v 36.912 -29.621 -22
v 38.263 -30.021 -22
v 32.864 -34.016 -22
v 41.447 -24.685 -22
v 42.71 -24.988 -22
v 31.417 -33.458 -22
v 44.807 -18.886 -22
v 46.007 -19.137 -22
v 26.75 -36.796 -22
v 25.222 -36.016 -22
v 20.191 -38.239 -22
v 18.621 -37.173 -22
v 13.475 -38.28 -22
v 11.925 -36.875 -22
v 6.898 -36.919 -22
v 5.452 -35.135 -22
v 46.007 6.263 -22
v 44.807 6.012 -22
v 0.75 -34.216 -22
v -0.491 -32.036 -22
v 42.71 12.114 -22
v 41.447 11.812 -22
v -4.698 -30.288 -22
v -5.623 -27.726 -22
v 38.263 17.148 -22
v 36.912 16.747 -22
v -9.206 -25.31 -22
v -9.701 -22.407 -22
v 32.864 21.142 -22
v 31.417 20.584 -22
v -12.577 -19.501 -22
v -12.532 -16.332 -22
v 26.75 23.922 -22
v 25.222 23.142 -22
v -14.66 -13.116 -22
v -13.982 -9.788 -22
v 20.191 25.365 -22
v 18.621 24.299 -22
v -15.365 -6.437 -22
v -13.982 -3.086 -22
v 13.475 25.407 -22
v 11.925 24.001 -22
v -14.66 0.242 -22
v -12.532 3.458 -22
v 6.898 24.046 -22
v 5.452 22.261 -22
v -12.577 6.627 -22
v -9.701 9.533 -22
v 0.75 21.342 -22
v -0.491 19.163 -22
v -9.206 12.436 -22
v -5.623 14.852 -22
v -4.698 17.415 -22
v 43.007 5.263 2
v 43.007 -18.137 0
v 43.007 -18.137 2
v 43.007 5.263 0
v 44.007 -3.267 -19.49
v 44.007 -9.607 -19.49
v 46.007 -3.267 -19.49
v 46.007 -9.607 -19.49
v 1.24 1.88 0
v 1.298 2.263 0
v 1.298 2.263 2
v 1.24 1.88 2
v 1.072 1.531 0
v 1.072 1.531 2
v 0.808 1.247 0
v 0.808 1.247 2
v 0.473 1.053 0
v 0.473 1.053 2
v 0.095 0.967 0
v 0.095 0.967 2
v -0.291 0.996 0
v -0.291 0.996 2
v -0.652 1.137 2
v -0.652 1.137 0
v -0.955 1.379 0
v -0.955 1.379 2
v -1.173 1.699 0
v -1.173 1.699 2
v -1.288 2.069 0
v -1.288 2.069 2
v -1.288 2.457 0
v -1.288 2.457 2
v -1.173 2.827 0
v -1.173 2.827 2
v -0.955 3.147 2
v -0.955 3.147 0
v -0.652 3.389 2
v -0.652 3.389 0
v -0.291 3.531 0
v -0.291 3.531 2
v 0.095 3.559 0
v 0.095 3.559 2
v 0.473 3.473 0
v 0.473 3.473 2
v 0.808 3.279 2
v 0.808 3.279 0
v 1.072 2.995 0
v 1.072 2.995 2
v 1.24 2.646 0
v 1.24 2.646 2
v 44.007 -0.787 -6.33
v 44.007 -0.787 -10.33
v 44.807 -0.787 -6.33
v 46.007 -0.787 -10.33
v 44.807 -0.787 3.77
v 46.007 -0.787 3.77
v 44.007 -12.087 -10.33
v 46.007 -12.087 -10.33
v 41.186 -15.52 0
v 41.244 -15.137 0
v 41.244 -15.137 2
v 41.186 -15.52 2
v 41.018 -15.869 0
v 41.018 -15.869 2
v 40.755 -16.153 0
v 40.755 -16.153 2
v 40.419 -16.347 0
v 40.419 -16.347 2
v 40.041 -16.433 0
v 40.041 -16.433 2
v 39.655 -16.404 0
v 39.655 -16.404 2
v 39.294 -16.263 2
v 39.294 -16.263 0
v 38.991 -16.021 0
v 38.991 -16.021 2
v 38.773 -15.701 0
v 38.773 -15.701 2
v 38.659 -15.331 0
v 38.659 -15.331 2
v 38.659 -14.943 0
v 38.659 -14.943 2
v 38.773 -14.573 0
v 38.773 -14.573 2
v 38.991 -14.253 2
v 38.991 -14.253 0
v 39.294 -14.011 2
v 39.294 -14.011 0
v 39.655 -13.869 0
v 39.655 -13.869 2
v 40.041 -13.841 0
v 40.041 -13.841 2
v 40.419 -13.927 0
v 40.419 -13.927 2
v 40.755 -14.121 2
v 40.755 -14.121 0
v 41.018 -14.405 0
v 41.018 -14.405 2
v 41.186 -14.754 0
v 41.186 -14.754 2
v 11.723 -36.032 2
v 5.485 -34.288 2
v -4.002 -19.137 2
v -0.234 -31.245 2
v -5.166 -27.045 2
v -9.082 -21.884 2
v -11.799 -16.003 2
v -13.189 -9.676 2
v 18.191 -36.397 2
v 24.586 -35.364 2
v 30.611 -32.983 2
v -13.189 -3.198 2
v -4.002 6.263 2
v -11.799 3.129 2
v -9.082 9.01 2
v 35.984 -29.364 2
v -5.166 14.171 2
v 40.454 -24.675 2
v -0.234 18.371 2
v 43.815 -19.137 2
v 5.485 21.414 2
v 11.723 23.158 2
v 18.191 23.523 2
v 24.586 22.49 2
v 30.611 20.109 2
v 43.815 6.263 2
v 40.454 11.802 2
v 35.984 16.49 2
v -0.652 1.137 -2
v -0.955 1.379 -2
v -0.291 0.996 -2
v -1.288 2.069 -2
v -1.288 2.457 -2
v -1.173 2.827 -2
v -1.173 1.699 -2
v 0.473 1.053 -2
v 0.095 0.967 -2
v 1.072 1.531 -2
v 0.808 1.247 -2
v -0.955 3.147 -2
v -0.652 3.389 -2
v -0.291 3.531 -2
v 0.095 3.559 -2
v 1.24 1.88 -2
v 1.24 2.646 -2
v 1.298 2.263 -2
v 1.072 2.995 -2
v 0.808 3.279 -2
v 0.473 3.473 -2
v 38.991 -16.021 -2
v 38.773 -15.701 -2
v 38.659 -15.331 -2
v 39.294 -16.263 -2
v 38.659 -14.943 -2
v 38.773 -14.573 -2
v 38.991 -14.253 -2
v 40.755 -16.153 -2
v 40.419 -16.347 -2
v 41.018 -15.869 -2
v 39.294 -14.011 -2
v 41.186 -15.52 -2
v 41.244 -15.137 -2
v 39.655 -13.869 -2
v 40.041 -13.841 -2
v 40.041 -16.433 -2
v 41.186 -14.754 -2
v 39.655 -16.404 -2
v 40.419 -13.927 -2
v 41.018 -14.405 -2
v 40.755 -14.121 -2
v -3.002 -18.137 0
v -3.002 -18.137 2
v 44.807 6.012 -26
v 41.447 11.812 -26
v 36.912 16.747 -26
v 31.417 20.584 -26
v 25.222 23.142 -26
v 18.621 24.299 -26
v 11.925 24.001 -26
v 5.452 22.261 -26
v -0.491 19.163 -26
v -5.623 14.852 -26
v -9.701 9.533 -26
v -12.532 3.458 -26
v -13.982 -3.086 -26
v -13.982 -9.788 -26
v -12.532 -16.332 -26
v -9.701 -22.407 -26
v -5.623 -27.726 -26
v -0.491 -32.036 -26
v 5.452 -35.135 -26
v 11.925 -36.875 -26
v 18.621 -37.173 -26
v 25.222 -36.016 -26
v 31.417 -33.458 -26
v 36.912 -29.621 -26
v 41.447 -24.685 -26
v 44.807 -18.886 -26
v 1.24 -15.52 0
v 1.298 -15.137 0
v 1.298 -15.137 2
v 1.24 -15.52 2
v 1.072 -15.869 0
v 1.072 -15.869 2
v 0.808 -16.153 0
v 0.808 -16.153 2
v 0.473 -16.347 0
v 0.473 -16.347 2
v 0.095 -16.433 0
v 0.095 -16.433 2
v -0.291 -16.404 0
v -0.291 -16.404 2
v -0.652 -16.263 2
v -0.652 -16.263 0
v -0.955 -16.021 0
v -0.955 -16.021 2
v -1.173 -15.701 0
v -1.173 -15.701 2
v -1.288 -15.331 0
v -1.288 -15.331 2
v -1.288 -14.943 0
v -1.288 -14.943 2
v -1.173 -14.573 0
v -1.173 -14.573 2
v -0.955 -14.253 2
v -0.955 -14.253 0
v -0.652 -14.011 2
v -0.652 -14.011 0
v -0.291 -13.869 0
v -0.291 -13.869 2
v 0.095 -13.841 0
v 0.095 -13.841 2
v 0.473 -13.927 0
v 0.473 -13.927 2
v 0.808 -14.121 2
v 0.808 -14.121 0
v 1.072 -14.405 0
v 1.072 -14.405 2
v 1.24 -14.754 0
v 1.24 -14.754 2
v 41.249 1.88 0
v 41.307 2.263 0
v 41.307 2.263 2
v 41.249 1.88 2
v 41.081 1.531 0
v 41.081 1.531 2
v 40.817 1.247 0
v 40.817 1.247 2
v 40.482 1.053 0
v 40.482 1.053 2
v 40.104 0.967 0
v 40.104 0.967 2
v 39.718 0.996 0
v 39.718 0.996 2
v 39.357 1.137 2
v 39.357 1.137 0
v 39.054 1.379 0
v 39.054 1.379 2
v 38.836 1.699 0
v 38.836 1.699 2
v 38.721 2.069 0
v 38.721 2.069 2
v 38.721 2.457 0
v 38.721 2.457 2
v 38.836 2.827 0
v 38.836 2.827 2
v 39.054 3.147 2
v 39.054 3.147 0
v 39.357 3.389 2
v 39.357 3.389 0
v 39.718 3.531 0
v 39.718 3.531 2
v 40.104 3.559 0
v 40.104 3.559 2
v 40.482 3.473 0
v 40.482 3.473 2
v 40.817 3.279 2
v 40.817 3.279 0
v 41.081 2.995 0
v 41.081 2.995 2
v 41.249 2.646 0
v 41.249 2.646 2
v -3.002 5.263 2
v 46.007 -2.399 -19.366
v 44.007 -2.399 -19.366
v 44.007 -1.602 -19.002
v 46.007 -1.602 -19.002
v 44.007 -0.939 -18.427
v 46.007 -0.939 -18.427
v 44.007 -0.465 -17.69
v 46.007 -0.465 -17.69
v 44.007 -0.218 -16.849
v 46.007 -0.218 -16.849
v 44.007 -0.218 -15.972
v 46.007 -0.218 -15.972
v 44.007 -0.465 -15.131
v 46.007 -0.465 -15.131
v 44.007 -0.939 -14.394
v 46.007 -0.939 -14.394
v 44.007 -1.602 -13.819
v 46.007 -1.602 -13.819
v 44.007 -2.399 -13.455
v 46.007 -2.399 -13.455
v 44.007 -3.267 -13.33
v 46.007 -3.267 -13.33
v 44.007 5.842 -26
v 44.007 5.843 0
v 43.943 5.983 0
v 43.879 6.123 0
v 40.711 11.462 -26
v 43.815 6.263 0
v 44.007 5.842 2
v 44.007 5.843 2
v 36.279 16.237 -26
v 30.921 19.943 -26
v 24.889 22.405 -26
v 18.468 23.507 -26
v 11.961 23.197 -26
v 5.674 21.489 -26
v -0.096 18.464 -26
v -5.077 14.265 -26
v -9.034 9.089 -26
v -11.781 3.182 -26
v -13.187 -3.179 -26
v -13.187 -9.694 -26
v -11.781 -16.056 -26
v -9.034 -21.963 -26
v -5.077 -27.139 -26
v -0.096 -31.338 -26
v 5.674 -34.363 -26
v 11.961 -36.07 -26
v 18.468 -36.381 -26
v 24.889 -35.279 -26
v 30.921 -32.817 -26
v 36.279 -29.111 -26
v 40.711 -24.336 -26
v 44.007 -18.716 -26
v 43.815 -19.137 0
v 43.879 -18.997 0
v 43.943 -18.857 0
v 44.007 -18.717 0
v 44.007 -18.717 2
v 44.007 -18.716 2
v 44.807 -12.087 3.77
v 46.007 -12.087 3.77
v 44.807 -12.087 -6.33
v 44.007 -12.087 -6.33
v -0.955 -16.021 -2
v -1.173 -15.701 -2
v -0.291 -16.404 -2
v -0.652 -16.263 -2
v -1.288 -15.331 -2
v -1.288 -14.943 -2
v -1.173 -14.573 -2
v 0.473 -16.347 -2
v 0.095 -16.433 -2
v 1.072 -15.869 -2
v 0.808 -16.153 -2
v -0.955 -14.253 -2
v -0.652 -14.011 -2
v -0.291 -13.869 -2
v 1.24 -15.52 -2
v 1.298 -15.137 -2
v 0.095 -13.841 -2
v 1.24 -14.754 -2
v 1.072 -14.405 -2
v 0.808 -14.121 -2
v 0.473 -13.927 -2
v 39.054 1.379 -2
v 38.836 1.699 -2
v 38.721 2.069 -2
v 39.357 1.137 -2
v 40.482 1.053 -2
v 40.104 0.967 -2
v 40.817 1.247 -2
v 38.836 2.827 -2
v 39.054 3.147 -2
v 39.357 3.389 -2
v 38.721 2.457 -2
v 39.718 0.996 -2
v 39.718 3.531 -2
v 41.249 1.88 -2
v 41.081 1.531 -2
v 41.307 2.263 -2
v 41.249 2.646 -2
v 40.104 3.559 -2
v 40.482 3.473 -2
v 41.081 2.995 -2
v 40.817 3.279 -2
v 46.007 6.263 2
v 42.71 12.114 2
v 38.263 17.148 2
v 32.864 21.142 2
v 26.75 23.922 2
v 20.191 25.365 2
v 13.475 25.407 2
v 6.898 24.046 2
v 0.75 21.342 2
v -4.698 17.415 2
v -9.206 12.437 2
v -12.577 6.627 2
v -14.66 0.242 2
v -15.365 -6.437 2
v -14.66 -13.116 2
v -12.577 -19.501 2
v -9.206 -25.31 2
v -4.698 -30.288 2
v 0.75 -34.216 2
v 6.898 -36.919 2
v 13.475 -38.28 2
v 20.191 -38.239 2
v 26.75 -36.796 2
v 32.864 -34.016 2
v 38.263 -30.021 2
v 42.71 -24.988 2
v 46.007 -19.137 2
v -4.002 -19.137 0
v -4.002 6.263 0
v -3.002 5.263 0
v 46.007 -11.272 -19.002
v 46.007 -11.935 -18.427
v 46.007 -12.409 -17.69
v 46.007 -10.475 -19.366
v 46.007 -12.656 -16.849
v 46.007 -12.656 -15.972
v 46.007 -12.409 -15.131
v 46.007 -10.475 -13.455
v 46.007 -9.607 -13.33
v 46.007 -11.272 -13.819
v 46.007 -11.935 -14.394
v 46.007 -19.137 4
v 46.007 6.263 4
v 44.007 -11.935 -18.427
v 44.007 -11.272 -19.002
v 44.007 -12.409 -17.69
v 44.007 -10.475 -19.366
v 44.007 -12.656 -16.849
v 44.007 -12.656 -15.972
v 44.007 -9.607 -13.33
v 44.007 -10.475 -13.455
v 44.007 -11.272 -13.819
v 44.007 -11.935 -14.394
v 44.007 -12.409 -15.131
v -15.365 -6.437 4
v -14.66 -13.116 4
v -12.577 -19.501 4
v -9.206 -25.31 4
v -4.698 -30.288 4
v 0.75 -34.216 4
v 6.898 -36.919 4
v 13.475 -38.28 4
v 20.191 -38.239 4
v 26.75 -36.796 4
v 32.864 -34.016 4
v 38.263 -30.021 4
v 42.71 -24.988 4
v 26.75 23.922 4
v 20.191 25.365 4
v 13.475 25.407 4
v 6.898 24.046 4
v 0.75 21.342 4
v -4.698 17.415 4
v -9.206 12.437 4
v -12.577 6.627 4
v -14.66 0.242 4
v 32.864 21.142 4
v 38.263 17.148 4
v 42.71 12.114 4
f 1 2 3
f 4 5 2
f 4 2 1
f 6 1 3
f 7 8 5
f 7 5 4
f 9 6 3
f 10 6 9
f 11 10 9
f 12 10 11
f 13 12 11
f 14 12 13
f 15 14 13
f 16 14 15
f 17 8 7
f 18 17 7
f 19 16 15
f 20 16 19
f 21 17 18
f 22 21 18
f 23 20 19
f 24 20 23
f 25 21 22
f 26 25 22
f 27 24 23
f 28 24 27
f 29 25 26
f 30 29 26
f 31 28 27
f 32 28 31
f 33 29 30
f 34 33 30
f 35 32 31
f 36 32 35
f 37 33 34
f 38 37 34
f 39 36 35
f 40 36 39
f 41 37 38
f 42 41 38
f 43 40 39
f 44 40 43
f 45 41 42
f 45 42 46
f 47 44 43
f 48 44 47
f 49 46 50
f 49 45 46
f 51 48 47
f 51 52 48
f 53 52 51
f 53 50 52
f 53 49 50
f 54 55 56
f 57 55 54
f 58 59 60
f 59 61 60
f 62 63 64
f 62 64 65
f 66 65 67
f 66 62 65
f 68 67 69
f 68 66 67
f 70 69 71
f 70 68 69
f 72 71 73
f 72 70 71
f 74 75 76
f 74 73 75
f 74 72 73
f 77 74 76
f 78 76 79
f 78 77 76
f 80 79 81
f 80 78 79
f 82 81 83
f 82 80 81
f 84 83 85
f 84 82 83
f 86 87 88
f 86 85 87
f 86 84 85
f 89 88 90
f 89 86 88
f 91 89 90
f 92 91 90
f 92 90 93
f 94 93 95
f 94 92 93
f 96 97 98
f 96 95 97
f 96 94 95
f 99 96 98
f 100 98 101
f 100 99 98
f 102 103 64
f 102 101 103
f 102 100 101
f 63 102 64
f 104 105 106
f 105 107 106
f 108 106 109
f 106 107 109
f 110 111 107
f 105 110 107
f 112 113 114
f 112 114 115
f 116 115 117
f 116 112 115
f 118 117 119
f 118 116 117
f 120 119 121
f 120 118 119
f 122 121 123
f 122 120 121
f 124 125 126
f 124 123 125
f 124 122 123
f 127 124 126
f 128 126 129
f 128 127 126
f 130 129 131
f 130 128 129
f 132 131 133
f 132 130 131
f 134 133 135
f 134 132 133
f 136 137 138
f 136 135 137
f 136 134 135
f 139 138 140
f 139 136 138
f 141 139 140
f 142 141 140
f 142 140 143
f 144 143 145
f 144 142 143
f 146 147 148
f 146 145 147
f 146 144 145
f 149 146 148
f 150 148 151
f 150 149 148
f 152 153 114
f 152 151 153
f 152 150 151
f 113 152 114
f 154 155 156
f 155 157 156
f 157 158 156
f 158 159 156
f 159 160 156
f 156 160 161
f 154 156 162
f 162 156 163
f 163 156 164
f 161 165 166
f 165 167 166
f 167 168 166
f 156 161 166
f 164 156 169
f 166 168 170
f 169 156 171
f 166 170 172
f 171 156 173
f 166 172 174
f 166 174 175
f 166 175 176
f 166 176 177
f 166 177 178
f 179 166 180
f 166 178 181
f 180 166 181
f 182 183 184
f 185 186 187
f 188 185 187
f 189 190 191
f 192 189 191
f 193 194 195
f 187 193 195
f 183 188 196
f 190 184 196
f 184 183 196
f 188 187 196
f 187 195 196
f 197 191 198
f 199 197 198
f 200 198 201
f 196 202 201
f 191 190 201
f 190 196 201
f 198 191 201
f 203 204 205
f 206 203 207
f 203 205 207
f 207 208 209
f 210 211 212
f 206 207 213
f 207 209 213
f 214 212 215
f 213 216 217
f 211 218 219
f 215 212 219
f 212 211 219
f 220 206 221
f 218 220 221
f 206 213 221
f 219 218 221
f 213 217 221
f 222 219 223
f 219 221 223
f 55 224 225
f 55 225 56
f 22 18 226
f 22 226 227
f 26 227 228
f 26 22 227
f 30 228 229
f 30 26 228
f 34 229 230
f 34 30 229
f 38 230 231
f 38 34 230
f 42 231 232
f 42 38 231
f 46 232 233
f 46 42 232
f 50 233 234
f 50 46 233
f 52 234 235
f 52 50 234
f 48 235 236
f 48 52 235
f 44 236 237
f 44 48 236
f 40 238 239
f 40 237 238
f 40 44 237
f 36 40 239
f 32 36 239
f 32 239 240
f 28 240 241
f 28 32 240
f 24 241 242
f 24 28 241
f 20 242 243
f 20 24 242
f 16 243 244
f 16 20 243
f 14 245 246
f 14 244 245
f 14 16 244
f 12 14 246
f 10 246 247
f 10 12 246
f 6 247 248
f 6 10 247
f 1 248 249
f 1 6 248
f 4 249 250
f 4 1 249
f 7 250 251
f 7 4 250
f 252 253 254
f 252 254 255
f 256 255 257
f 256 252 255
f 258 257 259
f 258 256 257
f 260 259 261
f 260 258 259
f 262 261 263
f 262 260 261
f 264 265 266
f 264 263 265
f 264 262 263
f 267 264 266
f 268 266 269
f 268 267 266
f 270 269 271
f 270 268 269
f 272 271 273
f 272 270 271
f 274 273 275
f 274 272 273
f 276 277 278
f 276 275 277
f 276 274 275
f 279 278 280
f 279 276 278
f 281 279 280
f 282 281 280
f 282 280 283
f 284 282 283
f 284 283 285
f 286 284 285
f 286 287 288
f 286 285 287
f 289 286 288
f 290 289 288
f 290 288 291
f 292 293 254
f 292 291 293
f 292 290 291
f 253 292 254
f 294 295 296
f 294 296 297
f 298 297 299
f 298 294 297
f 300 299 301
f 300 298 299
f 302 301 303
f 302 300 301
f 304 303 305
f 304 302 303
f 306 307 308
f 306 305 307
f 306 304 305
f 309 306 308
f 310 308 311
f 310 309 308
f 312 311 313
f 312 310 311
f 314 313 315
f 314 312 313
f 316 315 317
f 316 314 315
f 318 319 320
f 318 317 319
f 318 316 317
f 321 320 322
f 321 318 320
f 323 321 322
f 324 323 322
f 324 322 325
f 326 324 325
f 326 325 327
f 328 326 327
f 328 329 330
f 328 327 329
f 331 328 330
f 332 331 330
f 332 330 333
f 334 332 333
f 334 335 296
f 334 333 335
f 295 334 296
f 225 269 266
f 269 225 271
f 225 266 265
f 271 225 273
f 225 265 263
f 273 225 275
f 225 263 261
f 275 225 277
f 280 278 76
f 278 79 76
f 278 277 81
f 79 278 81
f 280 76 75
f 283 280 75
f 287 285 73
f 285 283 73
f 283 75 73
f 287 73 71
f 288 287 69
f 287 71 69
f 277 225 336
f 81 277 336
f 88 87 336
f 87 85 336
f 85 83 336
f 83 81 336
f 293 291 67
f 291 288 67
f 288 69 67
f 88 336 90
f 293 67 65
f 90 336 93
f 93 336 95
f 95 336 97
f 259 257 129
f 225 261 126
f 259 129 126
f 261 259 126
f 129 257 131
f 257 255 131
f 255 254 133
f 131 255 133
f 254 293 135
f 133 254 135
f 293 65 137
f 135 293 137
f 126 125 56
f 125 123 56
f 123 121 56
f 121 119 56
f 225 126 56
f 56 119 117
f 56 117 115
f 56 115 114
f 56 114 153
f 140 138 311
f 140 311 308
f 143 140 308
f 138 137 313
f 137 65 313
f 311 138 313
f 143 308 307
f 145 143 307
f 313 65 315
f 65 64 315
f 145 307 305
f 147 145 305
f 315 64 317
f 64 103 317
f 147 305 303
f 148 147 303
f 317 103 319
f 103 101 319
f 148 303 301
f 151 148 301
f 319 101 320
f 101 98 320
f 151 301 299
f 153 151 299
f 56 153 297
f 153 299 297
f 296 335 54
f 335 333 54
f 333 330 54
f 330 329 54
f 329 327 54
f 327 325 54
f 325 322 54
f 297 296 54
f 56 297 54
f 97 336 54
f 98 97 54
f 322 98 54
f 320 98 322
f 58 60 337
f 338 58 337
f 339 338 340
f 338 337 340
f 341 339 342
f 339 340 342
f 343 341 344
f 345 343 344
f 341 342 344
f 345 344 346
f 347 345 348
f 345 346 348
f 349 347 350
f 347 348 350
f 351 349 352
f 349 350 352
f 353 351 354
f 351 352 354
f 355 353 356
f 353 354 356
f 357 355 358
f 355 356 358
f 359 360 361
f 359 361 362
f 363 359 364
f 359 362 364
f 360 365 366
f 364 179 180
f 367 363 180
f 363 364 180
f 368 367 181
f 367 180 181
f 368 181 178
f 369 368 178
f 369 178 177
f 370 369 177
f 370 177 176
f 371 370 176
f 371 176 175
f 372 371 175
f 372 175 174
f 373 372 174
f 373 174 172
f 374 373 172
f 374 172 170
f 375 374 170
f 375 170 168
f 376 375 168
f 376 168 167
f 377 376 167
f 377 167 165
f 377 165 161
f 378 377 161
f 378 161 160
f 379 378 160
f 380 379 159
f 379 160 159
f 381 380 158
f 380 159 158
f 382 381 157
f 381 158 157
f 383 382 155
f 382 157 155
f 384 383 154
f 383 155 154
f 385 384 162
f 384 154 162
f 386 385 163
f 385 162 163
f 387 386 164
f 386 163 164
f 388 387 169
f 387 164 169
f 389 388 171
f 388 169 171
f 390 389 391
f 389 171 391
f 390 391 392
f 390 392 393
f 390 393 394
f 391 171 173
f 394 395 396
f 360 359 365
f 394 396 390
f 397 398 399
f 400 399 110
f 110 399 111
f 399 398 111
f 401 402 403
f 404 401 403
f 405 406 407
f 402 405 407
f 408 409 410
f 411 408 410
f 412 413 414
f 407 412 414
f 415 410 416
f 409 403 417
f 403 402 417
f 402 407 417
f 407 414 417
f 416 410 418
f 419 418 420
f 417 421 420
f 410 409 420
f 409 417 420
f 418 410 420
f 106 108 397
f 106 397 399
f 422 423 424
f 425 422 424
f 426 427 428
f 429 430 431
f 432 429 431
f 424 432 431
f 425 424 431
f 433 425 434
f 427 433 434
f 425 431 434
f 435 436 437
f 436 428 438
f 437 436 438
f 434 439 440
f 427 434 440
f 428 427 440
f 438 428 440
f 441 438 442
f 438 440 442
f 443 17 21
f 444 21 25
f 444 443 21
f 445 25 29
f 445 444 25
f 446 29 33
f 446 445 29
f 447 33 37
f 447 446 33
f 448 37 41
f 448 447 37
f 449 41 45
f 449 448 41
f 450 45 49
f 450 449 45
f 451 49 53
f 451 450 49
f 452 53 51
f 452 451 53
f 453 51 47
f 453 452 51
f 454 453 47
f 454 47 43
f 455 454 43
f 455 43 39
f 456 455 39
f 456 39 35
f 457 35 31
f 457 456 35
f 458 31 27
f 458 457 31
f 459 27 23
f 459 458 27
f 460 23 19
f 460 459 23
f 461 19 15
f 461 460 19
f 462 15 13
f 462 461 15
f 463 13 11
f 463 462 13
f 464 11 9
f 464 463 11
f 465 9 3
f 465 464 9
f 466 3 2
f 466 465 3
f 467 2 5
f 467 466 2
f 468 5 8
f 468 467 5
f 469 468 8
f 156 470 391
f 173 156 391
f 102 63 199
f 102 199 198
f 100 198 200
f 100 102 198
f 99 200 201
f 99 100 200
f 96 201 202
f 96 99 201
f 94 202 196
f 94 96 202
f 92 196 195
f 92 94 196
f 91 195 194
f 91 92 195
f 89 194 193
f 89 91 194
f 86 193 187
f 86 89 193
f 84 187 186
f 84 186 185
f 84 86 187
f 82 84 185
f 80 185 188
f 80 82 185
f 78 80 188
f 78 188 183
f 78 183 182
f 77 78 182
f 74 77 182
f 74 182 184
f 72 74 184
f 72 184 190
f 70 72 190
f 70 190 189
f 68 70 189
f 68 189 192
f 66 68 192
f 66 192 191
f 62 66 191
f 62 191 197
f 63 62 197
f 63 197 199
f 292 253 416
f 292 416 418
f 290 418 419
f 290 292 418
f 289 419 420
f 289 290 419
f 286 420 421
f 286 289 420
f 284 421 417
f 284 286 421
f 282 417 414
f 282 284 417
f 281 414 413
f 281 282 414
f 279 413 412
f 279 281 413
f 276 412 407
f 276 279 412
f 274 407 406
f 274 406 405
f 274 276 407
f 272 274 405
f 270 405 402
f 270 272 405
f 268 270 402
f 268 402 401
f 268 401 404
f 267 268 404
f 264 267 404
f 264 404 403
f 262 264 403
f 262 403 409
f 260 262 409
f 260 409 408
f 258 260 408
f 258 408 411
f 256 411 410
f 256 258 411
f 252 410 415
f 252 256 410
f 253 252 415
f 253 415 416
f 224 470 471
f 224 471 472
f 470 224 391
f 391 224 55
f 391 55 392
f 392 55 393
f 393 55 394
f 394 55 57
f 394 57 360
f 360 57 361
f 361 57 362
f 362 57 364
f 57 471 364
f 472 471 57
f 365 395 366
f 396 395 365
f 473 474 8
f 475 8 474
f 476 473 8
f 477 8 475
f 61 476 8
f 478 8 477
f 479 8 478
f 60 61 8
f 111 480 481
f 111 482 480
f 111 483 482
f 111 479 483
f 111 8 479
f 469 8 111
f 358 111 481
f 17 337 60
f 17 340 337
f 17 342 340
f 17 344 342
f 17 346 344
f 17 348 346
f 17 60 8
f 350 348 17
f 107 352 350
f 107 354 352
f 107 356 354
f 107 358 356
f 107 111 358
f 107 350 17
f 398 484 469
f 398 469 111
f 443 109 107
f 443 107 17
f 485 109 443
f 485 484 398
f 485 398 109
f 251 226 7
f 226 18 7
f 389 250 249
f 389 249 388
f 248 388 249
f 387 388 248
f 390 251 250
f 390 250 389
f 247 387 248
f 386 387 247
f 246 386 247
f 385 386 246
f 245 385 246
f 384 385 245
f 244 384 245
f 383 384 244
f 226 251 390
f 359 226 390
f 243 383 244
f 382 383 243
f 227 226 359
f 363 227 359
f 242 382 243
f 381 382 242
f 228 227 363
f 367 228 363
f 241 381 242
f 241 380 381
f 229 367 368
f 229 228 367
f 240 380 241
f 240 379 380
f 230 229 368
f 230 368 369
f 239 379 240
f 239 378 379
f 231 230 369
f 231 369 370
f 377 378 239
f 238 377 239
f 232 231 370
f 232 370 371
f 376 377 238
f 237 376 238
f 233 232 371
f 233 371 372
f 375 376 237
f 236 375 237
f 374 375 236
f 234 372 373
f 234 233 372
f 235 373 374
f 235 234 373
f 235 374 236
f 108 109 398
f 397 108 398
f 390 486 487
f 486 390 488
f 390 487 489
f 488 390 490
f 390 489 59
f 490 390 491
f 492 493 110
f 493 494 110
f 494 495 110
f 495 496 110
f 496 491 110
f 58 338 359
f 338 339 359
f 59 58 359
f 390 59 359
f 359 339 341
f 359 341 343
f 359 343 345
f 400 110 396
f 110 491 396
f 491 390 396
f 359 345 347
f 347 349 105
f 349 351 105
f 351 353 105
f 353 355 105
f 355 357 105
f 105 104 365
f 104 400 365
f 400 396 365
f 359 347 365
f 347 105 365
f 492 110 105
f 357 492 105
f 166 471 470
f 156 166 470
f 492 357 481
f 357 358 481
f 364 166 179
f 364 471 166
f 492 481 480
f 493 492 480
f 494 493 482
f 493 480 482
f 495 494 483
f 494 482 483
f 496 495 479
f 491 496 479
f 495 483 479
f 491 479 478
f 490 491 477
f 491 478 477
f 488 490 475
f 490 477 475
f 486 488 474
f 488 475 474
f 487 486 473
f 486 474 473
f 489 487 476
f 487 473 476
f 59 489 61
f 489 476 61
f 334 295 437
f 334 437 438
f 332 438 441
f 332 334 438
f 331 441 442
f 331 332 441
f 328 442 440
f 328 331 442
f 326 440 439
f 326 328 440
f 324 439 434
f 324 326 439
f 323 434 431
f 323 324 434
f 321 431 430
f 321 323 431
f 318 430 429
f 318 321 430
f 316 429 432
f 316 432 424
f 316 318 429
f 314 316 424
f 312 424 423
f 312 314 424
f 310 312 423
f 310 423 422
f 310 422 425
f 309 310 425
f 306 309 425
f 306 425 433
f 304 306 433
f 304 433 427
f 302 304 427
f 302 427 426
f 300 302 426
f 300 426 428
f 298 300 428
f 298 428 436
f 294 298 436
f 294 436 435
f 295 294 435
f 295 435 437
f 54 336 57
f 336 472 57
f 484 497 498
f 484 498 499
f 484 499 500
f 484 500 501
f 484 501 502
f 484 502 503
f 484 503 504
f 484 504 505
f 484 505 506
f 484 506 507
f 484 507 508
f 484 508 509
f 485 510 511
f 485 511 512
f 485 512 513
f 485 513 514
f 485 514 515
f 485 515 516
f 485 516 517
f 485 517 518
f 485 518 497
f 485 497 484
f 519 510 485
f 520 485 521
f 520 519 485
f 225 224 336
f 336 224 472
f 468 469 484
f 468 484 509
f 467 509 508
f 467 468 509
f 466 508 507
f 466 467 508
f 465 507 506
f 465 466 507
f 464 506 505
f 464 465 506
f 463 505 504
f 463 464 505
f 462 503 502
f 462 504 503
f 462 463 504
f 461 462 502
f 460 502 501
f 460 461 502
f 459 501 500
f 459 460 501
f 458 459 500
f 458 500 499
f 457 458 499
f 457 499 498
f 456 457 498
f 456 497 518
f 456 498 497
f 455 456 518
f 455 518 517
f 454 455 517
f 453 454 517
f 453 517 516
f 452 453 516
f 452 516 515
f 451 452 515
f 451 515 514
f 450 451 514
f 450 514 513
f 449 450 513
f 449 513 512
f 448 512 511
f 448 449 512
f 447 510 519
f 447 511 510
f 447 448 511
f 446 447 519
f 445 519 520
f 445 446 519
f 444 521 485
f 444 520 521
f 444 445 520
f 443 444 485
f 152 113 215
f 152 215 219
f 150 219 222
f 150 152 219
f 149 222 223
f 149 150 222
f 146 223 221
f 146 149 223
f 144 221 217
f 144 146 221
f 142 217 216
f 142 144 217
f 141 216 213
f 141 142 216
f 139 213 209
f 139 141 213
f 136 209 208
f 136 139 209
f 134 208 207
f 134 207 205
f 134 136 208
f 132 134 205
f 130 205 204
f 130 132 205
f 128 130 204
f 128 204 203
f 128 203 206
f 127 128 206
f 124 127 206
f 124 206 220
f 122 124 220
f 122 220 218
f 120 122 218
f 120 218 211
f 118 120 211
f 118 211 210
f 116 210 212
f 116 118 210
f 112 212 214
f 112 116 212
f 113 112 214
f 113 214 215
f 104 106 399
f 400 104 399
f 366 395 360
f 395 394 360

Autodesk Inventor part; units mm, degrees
ref_plane "YZ Plane" through (0, 0, 0) normal (1, 0, 0) x (0, 1, 0)
ref_plane "XZ Plane" through (0, 0, 0) normal (0, 1, 0) x (-1, 0, 0)
ref_plane "XY Plane" through (0, 0, 0) normal (0, 0, 1) x (1, 0, 0)
ref_plane "Arbeitsebene1" through (16.6353, -6.4369, 0) normal (0, 0, 1) x (1, 0, 0)
sketch "Skizze1" plane through (16.6353, -6.4369, 0) normal (0, 0, 1) x (1, 0, 0)
  circle A0 centre (-16.6375, -8.7) radius 1.3
  circle A1 centre (-16.6375, 8.7) radius 1.3
  circle A2 centre (23.3088, -8.7) radius 1.3
  circle A3 centre (23.3715, 8.7) radius 1.3
  point P0 (-16.6353, 6.4369)
extrude "Extrusion1" add sketch "Skizze1" along normal mid plane 4
ref_plane "Arbeitsebene3" through (16.6353, -6.4369, 0) normal (0, 0, 1) x (1, 0, 0)
sketch "Skizze11" plane through (16.6353, -6.4369, 0) normal (0, 0, 1) x (1, 0, 0)
  line L0 (19.6375, -11.7) -> (-19.6375, -11.7)
  line L1 (-19.6375, -11.7) -> (-19.6375, 11.7)
  line L2 (-20.6375, 12.7) -> (27.3715, 12.7)
  line L3 (-19.6375, 11.7) -> (-19.6375, -11.7)
  line L4 (-19.6375, -11.7) -> (26.3715, -11.7)
  line L5 (26.3715, -11.7) -> (26.3715, 11.7)
  line L6 (-19.6375, 11.7) -> (26.3715, 11.7)
  line L7 (-20.6375, -12.7) -> (27.3715, -12.7)
  line L8 (27.3715, -12.7) -> (27.3715, 12.7)
  line L9 (-20.6375, -12.7) -> (27.3715, -12.7)
  line L10 (27.3715, -12.7) -> (27.3715, 12.7)
  line L11 (27.3715, 12.7) -> (-20.6375, 12.7)
  line L12 (-20.6375, 12.7) -> (-20.6375, -12.7)
  point P0 (-16.6353, 6.4369)
  point P1 (19.6375, -11.7)
sketch "Skizze12" plane through (16.6353, -6.4369, 2) normal (0, 0, 1) x (1, 0, 0)
  line L0 (20.6375, 12.7) -> (-20.6375, 12.7) projected
  line L1 (-20.6375, 12.7) -> (-20.6375, -12.7) projected
  line L2 (-20.6375, -12.7) -> (20.6375, -12.7) projected
  line L3 (20.6375, -12.7) -> (20.6375, 12.7) projected
  circle A0 centre (0, 0) radius 32
  line L4 (20.6375, 12.7) -> (29.3719, 12.7)
  line L5 (29.3719, -12.7) -> (20.6375, -12.7)
  line L6 (29.3719, -12.7) -> (29.3719, 12.7)
  point P0 (-16.6353, 6.4369)
  dimension "d20" = 64
extrude "Extrusion7" add sketch "Skizze12" along normal blind 2 contours L3 L2 L1 L0 | L4 L6 L5 L3 | L0 L1 L2 L5 A0 L4
sketch "Skizze13" plane through (16.6353, -6.4369, 2) normal (0, 0, -1) x (-1, 0, 0)
  arc A0 (-29.3719, -12.7) -> (-29.3719, 12.7) centre (0, 0) ccw projected
  line L0 (-29.3719, -12.7) -> (-29.3719, 12.7) projected
  arc A1 (-27.3719, -12.2792) -> (-27.3719, 12.2792) centre (0, 0) ccw
  line L1 (-27.3719, -12.2792) -> (-27.3719, 12.2792)
  point P0 (16.6353, 6.4369)
  dimension "d23" = 2
extrude "Extrusion8" add sketch "Skizze13" along normal blind 24
sketch "Skizze14" plane through (16.6353, -6.4369, -22) normal (0, 0, -1) x (-1, 0, 0)
  line L0 (-27.3719, -12.2792) -> (-27.3719, 12.2792) projected
  arc A0 (-27.3719, -12.2792) -> (-27.3719, 12.2792) centre (0, 0) ccw projected
  line L1 (-28.1719, 12.4492) -> (-28.1719, -12.4492)
  arc A1 (-28.1719, -12.4492) -> (-28.1719, 12.4492) centre (0, 0) ccw
  point P0 (16.6353, 6.4369)
  dimension "d26" = 0.8
extrude "Extrusion9" add sketch "Skizze14" along normal blind 4
sketch "Skizze18" plane through (46.0073, -19.1369, 4) normal (1, 0, 0) x (0, 0, -1)
  line L0 (18.8305, 15.87) -> (18.8305, 9.53) construction
  line L1 (18.8305, 15.87) -> (18.8305, 12.7)
  line L2 (20.4105, 15.87) -> (20.4105, 9.53) construction
  line L3 (18.8305, 9.53) -> (18.8305, 15.87)
  line L4 (18.8305, 15.87) -> (18.8305, 9.53) construction
  line L5 (20.4105, 15.87) -> (20.4105, 9.53) construction
  line L6 (21.9905, 15.87) -> (21.9905, 9.53)
  line L7 (18.8305, 9.53) -> (18.8305, 15.87)
  arc A0 (21.9905, 15.87) -> (18.8305, 15.87) centre (20.4105, 15.87) ccw
  arc A1 (18.8305, 9.53) -> (21.9905, 9.53) centre (20.4105, 9.53) ccw
  line L8 (23.4905, 9.53) -> (23.4905, 15.87)
  arc A2 (23.4905, 15.87) -> (17.3305, 15.87) centre (20.4105, 15.87) ccw
  line L9 (17.3305, 15.87) -> (17.3305, 9.53)
  arc A3 (17.3305, 9.53) -> (23.4905, 9.53) centre (20.4105, 9.53) ccw
  line L10 (26, 25.4) -> (0, 25.4) projected
  line L11 (0, 0) -> (26, 0) projected
  point P0 (4, 19.1369)
  point P1 (20.4105, 12.7)
  point P2 (18.8305, 12.7)
  point P3 (20.4105, 12.7)
  dimension "d75" = 1.5
extrude "Extrusion10" cut sketch "Skizze18" against normal blind 4 contours A0 L6 A1 L3 L1 | A3 L9 A2 L8
sketch "Skizze19" plane through (46.0073, -19.1369, 4) normal (1, 0, 0) x (0, 0, -1)
  arc A0 (14.7505, 9.53) -> (22.9105, 9.53) centre (18.8305, 9.53) ccw projected
  line L0 (14.7505, 9.53) -> (14.7505, 15.87) projected
  arc A1 (22.9105, 15.87) -> (14.7505, 15.87) centre (18.8305, 15.87) ccw projected
  line L1 (0.5305, 7.35) -> (14.0305, 18.05) construction
  line L2 (0.5305, 18.05) -> (14.0305, 7.35) construction
  line L3 (14.3305, 7.05) -> (14.3305, 18.35)
  line L4 (14.3305, 18.35) -> (0.2305, 18.35)
  line L5 (0.2305, 18.35) -> (0.2305, 7.05)
  line L6 (0.2305, 7.05) -> (14.3305, 7.05)
  point P0 (4, 19.1369)
  dimension "d43" = 10.7
  dimension "d44" = 13.5
extrude "Extrusion11" cut sketch "Skizze19" against normal blind 1.2
sketch "Skizze20" plane through (44.8073, -19.1369, 4) normal (1, 0, 0) x (0, 0, -1)
  line L0 (14.3305, 18.35) -> (14.3305, 7.05) projected
  line L1 (0.2305, 18.35) -> (14.3305, 18.35) projected
  line L2 (14.3305, 7.05) -> (0.2305, 7.05) projected
  line L3 (14.3305, 18.35) -> (10.3305, 18.35)
  line L4 (10.3305, 18.35) -> (10.3305, 7.05)
  line L5 (10.3305, 7.05) -> (14.3305, 7.05)
  line L6 (14.3305, 7.05) -> (14.3305, 18.35)
  point P0 (4, 19.1369)
  dimension "d49" = 4
extrude "Extrusion12" cut sketch "Skizze20" against normal blind 1.2
extrude "Extrusion14" add sketch "Skizze11" along normal blind 2
properties part number "Boden"
